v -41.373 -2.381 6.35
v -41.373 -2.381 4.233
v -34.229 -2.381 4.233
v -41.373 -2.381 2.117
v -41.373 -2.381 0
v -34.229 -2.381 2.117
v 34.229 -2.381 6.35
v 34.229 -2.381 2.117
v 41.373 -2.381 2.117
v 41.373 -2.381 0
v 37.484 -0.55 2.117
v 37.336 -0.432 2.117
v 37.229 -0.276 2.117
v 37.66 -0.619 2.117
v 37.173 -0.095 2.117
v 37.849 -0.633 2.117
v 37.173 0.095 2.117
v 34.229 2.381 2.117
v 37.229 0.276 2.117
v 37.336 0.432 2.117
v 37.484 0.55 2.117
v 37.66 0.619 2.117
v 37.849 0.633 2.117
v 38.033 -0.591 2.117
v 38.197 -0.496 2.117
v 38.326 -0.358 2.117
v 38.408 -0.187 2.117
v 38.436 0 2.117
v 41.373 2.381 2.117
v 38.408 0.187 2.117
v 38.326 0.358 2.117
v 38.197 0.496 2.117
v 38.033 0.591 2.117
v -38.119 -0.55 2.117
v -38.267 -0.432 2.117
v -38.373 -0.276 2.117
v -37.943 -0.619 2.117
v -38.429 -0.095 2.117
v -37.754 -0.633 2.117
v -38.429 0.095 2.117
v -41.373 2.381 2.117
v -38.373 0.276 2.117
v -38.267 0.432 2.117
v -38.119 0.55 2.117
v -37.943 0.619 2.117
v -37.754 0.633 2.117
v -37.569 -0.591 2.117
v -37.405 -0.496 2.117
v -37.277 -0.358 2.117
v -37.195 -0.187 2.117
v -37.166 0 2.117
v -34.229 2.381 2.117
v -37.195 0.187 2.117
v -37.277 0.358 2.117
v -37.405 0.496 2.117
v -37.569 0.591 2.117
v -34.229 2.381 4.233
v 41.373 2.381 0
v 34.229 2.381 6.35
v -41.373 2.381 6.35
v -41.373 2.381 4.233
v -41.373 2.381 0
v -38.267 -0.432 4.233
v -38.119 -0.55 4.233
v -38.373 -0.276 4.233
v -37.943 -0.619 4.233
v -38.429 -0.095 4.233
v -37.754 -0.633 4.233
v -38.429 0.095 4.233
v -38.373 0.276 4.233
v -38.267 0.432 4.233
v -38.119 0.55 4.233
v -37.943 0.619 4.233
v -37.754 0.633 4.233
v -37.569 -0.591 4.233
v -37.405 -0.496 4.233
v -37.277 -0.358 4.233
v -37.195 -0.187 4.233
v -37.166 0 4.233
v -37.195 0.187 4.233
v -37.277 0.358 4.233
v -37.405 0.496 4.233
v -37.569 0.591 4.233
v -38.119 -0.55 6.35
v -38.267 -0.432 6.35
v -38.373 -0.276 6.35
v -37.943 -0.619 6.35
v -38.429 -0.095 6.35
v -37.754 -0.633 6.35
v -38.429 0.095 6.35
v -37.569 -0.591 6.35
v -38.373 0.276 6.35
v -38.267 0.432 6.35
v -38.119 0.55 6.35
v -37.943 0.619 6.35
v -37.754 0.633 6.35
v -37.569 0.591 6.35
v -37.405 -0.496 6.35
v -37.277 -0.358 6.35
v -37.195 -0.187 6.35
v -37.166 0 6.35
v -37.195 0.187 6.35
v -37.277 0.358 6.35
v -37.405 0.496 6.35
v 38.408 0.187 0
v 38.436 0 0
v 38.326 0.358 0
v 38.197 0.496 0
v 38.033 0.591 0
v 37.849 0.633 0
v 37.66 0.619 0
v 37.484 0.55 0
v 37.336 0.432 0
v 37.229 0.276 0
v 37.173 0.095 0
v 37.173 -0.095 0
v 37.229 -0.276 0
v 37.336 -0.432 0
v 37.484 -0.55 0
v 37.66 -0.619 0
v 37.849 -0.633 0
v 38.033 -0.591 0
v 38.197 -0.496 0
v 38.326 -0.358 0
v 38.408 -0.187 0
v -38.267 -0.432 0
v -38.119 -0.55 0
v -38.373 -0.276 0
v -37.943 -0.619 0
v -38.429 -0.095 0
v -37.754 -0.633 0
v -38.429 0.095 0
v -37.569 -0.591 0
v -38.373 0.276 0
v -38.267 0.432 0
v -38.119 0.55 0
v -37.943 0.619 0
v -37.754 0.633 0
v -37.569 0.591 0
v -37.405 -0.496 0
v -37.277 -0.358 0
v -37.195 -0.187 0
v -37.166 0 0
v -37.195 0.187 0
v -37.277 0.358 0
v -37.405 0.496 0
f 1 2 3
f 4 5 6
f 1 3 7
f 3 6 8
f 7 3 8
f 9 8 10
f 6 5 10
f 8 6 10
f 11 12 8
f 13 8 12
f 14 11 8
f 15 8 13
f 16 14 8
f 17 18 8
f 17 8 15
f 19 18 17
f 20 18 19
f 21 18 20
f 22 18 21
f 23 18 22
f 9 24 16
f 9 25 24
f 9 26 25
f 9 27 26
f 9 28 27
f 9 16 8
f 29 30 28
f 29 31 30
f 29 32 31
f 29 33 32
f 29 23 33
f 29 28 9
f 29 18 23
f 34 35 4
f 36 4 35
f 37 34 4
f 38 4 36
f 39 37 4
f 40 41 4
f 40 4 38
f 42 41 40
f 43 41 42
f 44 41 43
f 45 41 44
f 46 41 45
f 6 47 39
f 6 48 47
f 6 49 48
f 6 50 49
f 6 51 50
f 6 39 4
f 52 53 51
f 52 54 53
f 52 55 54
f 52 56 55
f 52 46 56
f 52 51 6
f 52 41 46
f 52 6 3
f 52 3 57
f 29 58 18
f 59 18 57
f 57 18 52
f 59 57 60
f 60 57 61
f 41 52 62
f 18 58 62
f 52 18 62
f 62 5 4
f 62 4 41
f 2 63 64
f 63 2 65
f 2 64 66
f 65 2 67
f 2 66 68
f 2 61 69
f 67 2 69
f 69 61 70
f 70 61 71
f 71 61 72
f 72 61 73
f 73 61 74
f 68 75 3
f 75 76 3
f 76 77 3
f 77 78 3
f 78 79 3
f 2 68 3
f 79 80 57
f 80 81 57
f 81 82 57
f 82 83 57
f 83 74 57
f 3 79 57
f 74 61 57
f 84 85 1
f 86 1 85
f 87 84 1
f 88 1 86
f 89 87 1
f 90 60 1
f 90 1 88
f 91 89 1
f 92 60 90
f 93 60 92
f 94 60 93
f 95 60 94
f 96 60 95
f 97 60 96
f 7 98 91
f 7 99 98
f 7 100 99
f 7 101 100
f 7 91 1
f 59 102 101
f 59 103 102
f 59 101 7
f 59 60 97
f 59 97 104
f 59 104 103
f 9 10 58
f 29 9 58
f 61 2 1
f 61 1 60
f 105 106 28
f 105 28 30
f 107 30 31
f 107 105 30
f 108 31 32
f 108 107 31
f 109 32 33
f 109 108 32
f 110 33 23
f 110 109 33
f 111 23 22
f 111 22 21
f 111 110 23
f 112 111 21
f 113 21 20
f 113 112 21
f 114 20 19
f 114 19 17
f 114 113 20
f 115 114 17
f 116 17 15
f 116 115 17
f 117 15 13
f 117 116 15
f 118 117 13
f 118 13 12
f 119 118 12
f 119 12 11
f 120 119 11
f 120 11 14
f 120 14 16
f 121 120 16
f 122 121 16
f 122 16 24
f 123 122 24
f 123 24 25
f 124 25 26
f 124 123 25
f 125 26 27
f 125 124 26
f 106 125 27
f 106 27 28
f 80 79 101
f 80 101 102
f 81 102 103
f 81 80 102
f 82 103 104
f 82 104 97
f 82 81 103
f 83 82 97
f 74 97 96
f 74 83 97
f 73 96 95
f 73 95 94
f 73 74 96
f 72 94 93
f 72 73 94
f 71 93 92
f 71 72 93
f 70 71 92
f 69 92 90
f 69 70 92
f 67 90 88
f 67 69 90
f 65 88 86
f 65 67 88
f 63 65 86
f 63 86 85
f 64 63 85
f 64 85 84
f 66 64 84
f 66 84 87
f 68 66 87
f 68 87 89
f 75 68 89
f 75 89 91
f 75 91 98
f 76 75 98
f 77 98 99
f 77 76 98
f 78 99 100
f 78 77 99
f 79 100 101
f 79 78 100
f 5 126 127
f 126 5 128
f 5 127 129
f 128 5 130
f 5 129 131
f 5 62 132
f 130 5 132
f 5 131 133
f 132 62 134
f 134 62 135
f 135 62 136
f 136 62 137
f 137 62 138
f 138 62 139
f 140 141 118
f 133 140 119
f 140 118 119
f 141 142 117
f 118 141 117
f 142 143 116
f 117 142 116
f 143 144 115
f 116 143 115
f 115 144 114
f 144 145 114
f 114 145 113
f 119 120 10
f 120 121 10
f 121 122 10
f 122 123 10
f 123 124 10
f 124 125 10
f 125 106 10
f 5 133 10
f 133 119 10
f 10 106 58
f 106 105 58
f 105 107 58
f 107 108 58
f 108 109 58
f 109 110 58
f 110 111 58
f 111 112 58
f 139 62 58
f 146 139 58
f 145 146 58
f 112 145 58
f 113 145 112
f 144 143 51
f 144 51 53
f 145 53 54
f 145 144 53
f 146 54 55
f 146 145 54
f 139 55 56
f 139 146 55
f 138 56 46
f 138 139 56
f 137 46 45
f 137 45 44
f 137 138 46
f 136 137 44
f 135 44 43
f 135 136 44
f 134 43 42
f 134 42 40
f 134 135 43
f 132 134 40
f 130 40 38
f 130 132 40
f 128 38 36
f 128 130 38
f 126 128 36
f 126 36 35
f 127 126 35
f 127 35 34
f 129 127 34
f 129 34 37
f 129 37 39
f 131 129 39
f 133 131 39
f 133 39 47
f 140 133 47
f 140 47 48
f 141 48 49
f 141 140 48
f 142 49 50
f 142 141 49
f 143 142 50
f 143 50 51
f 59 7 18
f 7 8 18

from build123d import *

# Parameters (mm, degrees)
F0_W     = 7.14375
F0_H     = 4.7625
F0_R     = 0.635
F0_W_2   = 68.4589182
F1_DEPTH = 2.1166666667
F2_DEPTH = 4.2333333333
F3_START = 4.2333333333
F3_DEPTH = 2.1166666667


with BuildPart() as f1:
    # F0 (on Top) → F1 (new body)
    with BuildSketch(Plane.XY):
        with Locations((-37.8013341, 0)):
            Rectangle(F0_W, F0_H)
        with Locations((-37.8013341, 0)):
            Circle(F0_R, mode=Mode.SUBTRACT)
        Rectangle(F0_W_2, F0_H)
        with Locations((37.8013341, 0)):
            Rectangle(F0_W, F0_H)
        with Locations((37.8013341, 0)):
            Circle(F0_R, mode=Mode.SUBTRACT)
    extrude(amount=F1_DEPTH)

    # F0 (on Top) → F2 (join)
    with BuildSketch(Plane.XY):
        Rectangle(F0_W_2, F0_H)
    extrude(amount=F2_DEPTH)

    # F0 (on Top) → F3 (join)
    with BuildSketch(Plane.XY.offset(F3_START)):
        with Locations((-37.8013341, 0)):
            Rectangle(F0_W, F0_H)
        with Locations((-37.8013341, 0)):
            Circle(F0_R, mode=Mode.SUBTRACT)
        Rectangle(F0_W_2, F0_H)
    extrude(amount=F3_DEPTH)


solid = f1.part
